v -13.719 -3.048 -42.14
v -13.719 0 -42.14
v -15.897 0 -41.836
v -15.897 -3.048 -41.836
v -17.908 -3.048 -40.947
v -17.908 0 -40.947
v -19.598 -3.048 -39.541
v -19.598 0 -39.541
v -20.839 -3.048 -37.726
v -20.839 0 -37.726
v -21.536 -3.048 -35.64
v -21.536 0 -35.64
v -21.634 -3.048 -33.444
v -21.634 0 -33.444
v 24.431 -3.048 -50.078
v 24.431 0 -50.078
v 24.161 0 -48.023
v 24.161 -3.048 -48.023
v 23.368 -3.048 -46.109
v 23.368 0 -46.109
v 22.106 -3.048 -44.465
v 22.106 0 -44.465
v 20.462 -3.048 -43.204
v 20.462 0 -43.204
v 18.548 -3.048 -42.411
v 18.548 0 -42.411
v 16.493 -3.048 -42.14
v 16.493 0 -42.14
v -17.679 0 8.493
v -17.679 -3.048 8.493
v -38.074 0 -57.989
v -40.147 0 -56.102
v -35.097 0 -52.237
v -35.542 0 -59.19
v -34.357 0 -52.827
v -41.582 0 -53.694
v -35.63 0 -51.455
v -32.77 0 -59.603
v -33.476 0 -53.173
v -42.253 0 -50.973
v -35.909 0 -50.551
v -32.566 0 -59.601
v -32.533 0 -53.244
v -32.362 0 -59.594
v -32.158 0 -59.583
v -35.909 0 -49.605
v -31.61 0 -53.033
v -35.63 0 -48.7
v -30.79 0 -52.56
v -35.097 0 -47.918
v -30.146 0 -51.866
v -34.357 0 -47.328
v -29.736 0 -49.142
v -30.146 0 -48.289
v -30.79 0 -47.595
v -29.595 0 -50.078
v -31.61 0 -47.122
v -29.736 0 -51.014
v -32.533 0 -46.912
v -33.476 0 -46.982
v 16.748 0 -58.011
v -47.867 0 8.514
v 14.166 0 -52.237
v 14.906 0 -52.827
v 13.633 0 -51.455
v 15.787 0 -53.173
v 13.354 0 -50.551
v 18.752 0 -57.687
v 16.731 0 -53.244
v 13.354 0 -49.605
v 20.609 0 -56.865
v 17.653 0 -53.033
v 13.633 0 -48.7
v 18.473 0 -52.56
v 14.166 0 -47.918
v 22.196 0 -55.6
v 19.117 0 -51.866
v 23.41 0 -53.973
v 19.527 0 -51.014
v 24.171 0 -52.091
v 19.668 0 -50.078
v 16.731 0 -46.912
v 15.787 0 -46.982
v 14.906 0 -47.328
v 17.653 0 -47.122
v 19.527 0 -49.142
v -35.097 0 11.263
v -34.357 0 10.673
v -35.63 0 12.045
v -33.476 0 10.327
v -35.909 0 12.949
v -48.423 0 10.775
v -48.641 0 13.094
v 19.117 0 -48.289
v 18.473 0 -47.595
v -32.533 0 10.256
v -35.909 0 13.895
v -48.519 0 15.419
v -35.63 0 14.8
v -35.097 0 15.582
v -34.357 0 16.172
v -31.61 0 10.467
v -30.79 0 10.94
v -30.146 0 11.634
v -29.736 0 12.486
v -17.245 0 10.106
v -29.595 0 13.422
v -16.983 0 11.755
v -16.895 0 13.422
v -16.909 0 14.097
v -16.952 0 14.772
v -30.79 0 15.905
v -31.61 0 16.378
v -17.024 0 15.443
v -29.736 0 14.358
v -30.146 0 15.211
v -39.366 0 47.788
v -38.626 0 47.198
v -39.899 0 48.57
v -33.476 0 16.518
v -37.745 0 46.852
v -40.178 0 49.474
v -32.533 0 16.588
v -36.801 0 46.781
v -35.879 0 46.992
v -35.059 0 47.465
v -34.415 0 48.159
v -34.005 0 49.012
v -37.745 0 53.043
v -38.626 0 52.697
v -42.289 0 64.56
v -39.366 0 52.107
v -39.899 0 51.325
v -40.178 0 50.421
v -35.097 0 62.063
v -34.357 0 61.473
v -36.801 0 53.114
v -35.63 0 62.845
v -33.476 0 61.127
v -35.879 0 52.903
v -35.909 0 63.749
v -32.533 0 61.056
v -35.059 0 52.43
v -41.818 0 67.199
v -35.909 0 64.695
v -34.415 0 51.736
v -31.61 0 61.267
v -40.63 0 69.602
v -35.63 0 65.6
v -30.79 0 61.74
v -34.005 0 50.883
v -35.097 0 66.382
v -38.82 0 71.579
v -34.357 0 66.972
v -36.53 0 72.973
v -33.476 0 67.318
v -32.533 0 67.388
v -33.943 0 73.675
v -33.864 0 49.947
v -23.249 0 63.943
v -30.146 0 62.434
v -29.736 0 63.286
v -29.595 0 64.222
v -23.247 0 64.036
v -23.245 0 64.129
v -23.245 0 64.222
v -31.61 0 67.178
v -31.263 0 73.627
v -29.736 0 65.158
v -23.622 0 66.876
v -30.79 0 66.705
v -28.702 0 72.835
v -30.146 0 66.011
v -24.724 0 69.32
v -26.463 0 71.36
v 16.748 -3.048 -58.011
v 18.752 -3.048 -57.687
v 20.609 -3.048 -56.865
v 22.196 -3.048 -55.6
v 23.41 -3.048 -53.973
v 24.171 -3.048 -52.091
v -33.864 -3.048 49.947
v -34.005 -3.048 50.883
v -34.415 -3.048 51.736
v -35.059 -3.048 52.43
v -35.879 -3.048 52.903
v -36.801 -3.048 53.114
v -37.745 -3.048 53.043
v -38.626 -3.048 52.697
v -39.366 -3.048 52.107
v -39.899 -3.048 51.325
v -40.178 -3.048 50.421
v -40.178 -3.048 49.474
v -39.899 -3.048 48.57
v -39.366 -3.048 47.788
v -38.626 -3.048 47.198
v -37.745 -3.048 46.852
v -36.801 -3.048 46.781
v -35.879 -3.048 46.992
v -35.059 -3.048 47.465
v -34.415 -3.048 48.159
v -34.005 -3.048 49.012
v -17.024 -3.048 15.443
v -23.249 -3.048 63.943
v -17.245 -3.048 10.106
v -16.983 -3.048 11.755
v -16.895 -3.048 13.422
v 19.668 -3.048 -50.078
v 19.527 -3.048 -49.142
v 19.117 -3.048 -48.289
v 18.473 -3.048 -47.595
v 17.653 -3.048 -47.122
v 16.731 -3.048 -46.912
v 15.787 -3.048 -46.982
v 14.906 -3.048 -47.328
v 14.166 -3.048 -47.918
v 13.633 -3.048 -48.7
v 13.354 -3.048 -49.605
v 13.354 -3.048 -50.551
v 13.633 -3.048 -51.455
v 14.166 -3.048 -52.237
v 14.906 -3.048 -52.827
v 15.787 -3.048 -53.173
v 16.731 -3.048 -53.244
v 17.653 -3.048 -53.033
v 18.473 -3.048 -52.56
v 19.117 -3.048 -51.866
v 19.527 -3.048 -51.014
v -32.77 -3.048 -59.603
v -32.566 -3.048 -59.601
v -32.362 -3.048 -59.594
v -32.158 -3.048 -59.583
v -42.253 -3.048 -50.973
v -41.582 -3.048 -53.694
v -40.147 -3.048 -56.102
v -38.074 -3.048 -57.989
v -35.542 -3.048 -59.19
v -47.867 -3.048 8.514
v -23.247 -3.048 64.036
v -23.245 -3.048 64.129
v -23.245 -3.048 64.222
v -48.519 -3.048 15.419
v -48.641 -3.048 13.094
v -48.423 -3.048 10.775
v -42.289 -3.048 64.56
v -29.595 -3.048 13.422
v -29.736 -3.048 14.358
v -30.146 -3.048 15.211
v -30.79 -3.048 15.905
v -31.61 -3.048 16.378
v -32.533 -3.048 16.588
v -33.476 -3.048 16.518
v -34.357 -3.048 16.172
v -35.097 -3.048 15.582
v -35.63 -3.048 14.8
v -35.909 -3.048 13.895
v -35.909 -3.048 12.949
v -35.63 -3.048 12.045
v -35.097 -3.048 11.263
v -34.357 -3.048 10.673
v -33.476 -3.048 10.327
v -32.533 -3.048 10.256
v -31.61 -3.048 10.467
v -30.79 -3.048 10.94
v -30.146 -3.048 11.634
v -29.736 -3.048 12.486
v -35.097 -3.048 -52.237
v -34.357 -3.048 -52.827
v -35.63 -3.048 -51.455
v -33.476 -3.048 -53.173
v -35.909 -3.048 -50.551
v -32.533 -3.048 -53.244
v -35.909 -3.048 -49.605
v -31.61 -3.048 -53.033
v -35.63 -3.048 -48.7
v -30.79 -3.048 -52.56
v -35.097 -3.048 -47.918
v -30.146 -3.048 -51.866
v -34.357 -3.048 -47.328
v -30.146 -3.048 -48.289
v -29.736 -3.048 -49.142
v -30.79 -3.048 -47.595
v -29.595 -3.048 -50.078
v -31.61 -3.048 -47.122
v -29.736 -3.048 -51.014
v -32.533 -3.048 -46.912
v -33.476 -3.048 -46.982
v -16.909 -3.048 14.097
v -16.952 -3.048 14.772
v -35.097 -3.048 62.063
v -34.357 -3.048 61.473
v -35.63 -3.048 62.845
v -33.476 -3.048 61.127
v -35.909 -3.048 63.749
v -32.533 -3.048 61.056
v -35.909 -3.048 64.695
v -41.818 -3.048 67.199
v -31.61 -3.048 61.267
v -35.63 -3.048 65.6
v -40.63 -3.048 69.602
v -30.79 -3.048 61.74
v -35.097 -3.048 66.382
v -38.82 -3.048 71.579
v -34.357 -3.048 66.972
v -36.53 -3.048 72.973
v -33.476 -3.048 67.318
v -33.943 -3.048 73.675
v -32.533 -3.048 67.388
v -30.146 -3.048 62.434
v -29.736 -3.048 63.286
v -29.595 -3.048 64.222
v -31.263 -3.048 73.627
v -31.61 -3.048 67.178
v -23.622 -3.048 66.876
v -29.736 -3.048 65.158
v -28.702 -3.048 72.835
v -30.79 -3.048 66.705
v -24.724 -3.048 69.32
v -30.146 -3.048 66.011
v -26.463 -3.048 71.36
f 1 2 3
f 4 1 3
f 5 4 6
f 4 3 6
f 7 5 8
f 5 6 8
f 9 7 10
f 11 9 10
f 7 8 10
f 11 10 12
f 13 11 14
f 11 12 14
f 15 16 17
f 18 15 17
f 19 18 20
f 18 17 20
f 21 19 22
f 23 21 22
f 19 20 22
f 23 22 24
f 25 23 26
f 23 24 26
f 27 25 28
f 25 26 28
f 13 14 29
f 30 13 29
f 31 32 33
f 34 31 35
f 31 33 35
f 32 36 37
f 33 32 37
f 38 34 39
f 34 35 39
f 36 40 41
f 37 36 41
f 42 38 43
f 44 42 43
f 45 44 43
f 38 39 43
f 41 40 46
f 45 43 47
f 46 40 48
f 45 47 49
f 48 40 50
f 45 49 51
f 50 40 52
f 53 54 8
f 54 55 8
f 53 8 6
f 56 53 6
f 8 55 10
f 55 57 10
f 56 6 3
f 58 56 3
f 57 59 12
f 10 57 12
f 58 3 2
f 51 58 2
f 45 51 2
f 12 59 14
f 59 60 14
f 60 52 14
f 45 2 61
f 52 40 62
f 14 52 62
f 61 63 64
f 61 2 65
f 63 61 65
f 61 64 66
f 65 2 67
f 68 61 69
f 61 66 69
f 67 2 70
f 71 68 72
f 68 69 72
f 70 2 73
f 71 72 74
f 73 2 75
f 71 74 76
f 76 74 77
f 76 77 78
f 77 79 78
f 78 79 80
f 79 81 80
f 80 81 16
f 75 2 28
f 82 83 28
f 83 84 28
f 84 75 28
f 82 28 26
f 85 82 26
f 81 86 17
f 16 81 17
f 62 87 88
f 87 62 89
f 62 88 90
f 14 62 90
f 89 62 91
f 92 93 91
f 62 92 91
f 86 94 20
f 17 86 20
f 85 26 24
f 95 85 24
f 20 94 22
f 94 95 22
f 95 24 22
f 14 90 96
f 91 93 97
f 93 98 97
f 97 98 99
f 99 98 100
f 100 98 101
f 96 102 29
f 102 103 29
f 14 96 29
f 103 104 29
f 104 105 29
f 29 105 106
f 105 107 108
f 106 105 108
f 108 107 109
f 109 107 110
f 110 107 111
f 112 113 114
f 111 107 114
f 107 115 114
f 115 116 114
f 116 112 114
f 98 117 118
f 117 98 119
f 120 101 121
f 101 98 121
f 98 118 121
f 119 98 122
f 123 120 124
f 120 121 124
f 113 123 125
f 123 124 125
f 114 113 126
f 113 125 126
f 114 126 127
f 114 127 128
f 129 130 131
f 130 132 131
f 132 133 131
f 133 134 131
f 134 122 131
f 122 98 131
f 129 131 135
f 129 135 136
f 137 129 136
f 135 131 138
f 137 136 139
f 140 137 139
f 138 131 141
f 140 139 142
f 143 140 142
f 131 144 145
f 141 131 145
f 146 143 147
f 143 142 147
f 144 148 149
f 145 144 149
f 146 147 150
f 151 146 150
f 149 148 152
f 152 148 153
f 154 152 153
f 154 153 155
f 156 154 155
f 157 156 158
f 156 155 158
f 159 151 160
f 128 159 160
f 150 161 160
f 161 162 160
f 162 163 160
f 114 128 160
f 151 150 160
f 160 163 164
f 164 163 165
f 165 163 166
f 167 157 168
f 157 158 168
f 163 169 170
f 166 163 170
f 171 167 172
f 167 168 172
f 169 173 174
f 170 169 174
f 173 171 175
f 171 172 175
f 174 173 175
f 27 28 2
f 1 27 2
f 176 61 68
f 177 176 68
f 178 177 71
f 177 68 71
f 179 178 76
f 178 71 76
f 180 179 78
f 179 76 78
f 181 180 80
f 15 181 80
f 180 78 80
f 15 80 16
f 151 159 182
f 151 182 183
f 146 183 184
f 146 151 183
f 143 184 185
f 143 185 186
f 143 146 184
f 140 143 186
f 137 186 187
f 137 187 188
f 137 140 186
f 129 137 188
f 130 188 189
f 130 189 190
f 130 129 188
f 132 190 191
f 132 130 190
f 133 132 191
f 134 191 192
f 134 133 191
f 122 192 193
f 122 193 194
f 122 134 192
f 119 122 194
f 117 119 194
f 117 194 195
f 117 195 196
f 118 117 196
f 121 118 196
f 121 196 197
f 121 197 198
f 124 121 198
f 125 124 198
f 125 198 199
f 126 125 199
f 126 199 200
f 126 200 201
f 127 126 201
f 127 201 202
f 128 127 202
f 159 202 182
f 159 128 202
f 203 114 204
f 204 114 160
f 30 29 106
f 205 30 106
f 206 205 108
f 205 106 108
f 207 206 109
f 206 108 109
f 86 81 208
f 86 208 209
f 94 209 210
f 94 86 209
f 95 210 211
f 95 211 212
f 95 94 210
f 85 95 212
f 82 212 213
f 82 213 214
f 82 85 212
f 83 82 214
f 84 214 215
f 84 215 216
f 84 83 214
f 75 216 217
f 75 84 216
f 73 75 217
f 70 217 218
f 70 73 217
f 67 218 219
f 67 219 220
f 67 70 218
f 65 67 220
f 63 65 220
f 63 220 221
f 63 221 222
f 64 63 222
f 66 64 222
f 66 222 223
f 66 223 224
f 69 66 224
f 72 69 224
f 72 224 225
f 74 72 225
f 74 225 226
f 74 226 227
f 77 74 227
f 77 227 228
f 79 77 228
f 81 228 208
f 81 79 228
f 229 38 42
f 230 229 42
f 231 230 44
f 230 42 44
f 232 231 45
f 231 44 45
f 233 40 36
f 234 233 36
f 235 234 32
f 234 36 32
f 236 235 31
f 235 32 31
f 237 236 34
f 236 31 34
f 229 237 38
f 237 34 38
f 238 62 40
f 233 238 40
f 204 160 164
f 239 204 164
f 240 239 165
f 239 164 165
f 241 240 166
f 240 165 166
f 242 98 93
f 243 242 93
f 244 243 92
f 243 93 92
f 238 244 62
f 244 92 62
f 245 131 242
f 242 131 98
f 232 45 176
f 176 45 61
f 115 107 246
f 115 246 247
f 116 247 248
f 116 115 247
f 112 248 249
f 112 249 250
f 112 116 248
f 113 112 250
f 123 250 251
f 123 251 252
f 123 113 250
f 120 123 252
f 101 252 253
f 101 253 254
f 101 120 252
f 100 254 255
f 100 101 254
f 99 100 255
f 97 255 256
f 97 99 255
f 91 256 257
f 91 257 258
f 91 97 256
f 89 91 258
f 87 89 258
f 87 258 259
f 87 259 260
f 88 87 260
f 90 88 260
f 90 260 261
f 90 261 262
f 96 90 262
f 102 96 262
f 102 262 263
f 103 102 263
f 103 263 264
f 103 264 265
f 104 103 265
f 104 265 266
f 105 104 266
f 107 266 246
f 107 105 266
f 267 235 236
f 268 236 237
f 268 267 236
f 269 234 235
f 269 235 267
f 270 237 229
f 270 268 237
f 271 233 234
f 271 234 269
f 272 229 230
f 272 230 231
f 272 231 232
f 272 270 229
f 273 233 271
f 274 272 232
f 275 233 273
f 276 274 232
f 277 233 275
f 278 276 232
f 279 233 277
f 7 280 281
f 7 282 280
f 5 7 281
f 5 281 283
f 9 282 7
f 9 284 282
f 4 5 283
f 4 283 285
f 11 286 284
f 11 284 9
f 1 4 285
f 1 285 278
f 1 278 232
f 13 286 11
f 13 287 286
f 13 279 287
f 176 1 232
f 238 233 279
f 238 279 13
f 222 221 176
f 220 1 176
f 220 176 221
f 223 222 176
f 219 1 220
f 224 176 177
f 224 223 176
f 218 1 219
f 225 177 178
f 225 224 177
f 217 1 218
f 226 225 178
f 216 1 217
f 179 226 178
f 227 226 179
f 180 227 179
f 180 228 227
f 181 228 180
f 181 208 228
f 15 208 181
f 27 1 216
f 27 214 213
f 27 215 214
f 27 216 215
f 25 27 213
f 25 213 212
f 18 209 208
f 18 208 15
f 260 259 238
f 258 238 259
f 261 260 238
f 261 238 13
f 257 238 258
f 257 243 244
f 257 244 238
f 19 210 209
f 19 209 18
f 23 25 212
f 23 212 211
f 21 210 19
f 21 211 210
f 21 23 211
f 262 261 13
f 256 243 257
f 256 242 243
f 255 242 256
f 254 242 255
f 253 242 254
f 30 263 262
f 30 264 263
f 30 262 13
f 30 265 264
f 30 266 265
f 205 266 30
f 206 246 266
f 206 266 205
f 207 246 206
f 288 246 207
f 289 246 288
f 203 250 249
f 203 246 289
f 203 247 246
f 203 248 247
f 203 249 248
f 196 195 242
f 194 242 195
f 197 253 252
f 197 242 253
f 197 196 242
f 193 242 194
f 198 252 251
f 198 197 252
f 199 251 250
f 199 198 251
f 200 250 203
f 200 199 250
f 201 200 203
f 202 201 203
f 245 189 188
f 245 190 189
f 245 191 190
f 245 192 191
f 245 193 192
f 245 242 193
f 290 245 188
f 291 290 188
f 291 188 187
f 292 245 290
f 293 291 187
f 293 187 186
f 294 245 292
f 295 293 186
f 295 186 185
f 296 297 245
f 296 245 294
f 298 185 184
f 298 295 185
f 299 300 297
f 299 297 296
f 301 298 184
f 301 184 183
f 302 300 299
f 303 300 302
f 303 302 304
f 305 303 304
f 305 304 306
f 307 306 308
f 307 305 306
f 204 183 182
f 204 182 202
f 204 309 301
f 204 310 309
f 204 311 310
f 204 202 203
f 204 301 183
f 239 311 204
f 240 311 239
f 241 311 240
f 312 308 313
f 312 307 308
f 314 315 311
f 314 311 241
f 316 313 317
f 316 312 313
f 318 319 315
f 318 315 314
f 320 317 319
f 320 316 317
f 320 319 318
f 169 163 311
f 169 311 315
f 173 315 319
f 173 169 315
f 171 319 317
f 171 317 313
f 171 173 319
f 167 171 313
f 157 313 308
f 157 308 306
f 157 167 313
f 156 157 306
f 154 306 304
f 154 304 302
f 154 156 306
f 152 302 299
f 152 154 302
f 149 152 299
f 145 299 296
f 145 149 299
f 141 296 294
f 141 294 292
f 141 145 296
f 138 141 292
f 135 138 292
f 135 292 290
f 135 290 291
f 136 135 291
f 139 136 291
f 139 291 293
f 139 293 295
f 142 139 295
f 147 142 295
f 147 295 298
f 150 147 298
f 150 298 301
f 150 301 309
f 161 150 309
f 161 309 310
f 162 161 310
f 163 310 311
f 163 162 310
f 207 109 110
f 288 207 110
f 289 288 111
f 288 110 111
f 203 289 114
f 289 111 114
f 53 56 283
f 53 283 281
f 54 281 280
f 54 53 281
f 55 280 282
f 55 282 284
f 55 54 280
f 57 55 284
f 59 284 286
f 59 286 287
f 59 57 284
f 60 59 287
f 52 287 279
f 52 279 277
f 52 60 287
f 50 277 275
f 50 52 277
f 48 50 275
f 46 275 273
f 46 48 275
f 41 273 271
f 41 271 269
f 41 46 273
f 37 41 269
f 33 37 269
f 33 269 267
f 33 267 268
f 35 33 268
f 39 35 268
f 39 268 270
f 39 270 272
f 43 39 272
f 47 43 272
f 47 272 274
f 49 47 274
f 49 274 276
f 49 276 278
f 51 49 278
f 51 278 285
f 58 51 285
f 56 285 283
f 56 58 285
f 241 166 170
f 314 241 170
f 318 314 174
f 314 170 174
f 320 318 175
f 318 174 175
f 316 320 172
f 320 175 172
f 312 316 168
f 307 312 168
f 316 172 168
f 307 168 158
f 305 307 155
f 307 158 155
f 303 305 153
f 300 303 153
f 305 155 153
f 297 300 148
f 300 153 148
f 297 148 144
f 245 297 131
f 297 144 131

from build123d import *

# Parameters (mm, degrees)
F0_R     = 3.175
F1_DEPTH = 3.048


with BuildPart() as f1:
    # F0 (on Front) → F1 (new body)
    with BuildSketch(Plane.XZ):
        with BuildLine():
            ThreePointArc((-23.2488528316, 63.9433400749), (-23.2457905964, 64.0827574545), (-23.2447697784, 64.222204724))
            ThreePointArc((-23.2447697784, 64.222204724), (-32.6010796562, 73.7457108348), (-42.2887946902, 64.5595320539))
            ThreePointArc((-42.2887946902, 64.5595320539), (-33.0778672203, 54.7021889169), (-23.2488528316, 63.9433400749))
        make_face()
        with Locations((-32.7697697784, 64.222204724)):
            Circle(F0_R, mode=Mode.SUBTRACT)
        with BuildLine():
            ThreePointArc((-23.2488528316, 63.9433400749), (-33.0778672203, 54.7021889169), (-42.2887946902, 64.5595320539))
            Line((-42.2887946902, 64.5595320539), (-48.5187123814, 15.4188098138))
            ThreePointArc((-48.5187123814, 15.4188098138), (-32.7820421912, 29.2971999803), (-17.023933011, 15.4431573445))
            Line((-17.023933011, 15.4431573445), (-23.2488528316, 63.9433400749))
        make_face()
        with Locations((-37.0385125279, 49.947404724)):
            Circle(F0_R, mode=Mode.SUBTRACT)
        with BuildLine():
            Line((-47.8670611639, 8.5143113042), (-48.5187123814, 15.4188098138))
            ThreePointArc((-48.5187123814, 15.4188098138), (-48.5745337038, 11.9305404647), (-47.8670611639, 8.5143113042))
        make_face()
        with BuildLine():
            ThreePointArc((-17.023933011, 15.4431573445), (-32.7820421912, 29.2971999803), (-48.5187123814, 15.4188098138))
            Line((-48.5187123814, 15.4188098138), (-47.8670611639, 8.5143113042))
            ThreePointArc((-47.8670611639, 8.5143113042), (-32.7807619476, -2.4527914704), (-17.6792895161, 8.4934086789))
            Line((-17.6792895161, 8.4934086789), (-17.023933011, 15.4431573445))
        make_face()
        with Locations((-32.7697697784, 13.422204724)):
            Circle(F0_R, mode=Mode.SUBTRACT)
        with BuildLine():
            ThreePointArc((-16.8947697784, 13.422204724), (-16.9270934943, 14.4347427029), (-17.023933011, 15.4431573445))
            Line((-17.023933011, 15.4431573445), (-17.6792895161, 8.4934086789))
            ThreePointArc((-17.6792895161, 8.4934086789), (-17.0921264739, 10.926783834), (-16.8947697784, 13.422204724))
        make_face()
        with BuildLine():
            ThreePointArc((-17.6792895161, 8.4934086789), (-32.7807619476, -2.4527914704), (-47.8670611639, 8.5143113042))
            Line((-47.8670611639, 8.5143113042), (-42.2526281336, -50.9727938316))
            ThreePointArc((-42.2526281336, -50.9727938316), (-33.2177648488, -40.5633365202), (-23.2447697784, -50.077795276))
            ThreePointArc((-23.2447697784, -50.077795276), (-25.8216856464, -56.5931426878), (-32.1581035098, -59.5831353213))
            Line((-32.1581035098, -59.5831353213), (16.7484584113, -58.0111983949))
            ThreePointArc((16.7484584113, -58.0111983949), (8.5569901399, -50.2053080097), (16.4934658536, -42.140295276))
            Line((16.4934658536, -42.140295276), (-13.7188447097, -42.140295276))
            ThreePointArc((-13.7188447097, -42.140295276), (-19.5984538444, -39.5413452668), (-21.6339307019, -33.4437081269))
            Line((-21.6339307019, -33.4437081269), (-17.6792895161, 8.4934086789))
        make_face()
        with BuildLine():
            ThreePointArc((-23.2447697784, -50.077795276), (-33.2177648488, -40.5633365202), (-42.2526281336, -50.9727938316))
            ThreePointArc((-42.2526281336, -50.9727938316), (-39.1807277317, -57.1223139339), (-32.7697697784, -59.602795276))
            Line((-32.7697697784, -59.602795276), (-32.1581035098, -59.5831353213))
            ThreePointArc((-32.1581035098, -59.5831353213), (-25.8216856464, -56.5931426878), (-23.2447697784, -50.077795276))
        make_face()
        with Locations((-32.7697697784, -50.077795276)):
            Circle(F0_R, mode=Mode.SUBTRACT)
        with BuildLine():
            Line((-32.1581035098, -59.5831353213), (-32.7697697784, -59.602795276))
            ThreePointArc((-32.7697697784, -59.602795276), (-32.4637787091, -59.5978790186), (-32.1581035098, -59.5831353213))
        make_face()
        with BuildLine():
            ThreePointArc((24.4309658536, -50.077795276), (22.1061259292, -44.4651352004), (16.4934658536, -42.140295276))
            ThreePointArc((16.4934658536, -42.140295276), (8.5569901399, -50.2053080097), (16.7484584113, -58.0111983949))
            ThreePointArc((16.7484584113, -58.0111983949), (22.195566768, -55.5995659532), (24.4309658536, -50.077795276))
        make_face()
        with Locations((16.4934658536, -50.077795276)):
            Circle(F0_R, mode=Mode.SUBTRACT)
    extrude(amount=F1_DEPTH)


solid = f1.part
